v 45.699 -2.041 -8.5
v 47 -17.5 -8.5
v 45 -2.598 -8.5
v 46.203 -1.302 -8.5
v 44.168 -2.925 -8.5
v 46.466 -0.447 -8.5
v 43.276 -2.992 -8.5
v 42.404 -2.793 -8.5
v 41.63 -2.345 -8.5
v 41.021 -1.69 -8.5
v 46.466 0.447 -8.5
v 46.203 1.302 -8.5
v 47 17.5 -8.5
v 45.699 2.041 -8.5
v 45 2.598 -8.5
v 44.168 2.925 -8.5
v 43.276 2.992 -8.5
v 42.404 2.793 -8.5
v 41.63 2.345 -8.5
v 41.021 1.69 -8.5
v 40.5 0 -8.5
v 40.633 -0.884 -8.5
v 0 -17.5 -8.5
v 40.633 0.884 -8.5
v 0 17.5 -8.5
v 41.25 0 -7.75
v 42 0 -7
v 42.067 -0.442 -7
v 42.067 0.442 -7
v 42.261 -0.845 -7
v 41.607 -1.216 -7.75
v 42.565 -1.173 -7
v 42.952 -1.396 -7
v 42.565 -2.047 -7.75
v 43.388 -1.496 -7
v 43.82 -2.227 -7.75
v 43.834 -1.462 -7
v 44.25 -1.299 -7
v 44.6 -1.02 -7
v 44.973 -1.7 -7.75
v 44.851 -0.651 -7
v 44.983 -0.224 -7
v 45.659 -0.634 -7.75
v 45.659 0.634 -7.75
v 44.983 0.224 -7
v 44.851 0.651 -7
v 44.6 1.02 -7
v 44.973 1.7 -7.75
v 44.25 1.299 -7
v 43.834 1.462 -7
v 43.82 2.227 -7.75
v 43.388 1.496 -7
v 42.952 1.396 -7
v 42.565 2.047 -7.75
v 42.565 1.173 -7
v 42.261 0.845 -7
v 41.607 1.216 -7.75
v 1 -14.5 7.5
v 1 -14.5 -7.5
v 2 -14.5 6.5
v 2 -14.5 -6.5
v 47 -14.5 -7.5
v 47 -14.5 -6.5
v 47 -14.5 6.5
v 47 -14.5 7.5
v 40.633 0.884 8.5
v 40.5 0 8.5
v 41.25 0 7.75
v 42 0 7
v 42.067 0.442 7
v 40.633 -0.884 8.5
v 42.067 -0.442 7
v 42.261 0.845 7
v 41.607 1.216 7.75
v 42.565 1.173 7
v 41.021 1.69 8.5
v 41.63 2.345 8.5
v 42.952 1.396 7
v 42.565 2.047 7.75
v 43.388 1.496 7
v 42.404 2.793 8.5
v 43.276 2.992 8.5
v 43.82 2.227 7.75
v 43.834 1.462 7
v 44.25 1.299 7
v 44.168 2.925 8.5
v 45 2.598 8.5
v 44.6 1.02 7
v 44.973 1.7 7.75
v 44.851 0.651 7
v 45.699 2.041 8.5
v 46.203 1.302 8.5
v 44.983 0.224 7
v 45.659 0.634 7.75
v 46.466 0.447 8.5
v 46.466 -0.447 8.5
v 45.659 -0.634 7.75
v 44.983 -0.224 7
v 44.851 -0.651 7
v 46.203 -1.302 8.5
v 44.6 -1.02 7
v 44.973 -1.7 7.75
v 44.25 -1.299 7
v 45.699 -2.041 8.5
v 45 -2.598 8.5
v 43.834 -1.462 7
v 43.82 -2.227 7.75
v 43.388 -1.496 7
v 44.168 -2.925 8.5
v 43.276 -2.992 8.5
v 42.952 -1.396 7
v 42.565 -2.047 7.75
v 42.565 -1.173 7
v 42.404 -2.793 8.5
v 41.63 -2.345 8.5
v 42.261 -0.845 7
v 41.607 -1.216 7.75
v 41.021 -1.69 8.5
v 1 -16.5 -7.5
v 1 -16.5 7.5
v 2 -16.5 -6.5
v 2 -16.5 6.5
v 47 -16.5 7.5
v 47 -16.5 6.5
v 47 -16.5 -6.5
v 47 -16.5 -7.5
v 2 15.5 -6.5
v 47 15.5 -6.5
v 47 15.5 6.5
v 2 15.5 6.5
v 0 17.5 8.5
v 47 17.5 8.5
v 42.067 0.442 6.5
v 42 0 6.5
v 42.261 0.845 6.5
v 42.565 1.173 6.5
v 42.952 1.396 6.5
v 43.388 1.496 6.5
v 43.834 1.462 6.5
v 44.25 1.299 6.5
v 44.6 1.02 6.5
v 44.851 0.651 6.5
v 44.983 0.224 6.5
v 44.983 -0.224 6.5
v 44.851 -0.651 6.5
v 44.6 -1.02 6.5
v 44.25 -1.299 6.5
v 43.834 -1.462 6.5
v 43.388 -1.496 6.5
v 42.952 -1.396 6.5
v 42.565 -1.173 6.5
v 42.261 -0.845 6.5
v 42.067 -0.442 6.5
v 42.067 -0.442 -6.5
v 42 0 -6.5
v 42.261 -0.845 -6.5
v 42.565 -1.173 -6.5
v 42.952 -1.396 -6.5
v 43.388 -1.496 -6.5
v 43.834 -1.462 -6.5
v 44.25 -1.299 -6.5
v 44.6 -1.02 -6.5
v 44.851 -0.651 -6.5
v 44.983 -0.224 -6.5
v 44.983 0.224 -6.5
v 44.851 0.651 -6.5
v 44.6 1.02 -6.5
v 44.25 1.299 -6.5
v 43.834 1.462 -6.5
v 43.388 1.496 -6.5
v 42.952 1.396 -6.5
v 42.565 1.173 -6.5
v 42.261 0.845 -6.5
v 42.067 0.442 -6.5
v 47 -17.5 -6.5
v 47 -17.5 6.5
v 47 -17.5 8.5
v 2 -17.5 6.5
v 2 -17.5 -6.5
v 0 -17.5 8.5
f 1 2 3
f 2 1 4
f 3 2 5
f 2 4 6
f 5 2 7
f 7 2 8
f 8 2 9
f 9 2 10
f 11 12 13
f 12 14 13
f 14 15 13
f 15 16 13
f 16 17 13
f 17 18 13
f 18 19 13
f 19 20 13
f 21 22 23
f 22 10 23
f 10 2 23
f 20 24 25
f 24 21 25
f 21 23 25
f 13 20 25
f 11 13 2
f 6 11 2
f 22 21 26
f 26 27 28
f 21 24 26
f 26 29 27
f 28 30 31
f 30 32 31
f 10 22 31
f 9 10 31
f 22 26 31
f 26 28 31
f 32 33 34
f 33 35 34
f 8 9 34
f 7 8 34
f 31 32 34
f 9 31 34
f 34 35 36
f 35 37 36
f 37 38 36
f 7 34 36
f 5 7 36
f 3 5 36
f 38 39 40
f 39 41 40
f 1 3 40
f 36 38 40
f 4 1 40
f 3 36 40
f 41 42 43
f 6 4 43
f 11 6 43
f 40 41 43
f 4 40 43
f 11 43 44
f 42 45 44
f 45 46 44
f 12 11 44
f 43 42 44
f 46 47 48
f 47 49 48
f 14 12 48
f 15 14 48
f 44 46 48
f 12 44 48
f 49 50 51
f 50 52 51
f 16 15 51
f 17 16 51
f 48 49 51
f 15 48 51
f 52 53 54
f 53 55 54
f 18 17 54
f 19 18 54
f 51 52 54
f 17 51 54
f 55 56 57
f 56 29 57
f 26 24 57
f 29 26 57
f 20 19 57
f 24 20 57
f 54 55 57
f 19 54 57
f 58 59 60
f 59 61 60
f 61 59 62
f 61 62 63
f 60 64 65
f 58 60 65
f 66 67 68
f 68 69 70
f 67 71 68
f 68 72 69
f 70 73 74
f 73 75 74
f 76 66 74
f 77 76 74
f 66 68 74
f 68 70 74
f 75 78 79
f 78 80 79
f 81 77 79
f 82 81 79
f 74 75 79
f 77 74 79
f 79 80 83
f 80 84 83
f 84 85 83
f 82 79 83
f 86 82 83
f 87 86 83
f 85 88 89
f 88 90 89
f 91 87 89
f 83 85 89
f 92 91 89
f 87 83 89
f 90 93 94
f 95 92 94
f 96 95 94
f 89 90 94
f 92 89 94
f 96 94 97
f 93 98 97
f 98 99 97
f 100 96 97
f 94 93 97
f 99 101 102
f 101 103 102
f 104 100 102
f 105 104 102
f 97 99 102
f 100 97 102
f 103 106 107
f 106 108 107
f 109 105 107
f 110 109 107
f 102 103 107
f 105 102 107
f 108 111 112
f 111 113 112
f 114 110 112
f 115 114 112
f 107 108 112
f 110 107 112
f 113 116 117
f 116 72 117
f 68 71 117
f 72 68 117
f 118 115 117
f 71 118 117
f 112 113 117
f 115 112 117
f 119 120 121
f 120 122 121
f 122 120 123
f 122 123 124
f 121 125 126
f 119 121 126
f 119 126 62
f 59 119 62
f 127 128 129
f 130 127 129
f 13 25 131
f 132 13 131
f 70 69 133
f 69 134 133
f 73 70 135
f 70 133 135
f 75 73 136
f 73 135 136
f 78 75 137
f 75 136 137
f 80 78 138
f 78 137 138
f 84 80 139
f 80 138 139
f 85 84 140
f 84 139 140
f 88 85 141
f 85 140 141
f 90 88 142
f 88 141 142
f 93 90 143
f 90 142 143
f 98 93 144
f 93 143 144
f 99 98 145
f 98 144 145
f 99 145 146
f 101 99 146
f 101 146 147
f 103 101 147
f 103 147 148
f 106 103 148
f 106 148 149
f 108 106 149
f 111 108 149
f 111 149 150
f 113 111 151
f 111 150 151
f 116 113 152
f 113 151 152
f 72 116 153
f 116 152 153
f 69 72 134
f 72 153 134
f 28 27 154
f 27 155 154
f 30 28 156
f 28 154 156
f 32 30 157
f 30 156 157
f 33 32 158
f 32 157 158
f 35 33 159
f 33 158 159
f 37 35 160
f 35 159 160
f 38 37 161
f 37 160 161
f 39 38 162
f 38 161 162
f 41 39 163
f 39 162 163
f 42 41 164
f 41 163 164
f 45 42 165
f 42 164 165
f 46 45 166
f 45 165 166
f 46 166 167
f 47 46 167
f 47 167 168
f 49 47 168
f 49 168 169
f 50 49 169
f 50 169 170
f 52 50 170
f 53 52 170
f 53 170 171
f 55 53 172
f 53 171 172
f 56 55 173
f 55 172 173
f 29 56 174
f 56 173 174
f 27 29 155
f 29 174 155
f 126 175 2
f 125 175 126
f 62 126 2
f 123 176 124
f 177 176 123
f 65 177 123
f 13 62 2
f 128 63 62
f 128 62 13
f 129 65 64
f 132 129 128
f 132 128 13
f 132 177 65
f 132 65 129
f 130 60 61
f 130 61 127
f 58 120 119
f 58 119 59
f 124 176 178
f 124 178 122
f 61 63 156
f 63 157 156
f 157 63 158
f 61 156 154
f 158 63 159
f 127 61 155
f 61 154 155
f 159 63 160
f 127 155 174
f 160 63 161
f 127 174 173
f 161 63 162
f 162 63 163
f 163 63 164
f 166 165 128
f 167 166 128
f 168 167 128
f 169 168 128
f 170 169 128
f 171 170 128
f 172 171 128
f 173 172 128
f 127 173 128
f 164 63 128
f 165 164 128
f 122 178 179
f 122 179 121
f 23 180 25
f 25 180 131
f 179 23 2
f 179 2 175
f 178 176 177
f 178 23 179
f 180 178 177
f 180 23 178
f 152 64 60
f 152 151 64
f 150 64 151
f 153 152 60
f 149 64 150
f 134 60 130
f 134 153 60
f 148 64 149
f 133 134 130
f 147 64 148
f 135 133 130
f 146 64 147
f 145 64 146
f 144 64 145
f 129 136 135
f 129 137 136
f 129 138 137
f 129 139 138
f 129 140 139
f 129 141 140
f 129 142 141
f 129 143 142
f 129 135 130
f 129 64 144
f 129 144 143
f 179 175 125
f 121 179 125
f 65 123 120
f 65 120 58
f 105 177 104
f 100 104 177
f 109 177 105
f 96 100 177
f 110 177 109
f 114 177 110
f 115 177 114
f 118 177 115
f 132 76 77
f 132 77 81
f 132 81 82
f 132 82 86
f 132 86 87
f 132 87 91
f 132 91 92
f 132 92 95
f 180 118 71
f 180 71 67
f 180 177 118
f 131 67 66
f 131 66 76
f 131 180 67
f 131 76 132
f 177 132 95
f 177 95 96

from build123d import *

# Parameters (mm, degrees)
F0_W           = 35
F0_H           = 17
F1_DEPTH       = 47
F2_W           = 30
F2_H           = 13
F2_W_2         = 1
F3_DEPTH       = 45
F2_W_3         = 2
F2_H_2         = 1
F4_DEPTH       = 46
F6_D           = 3
F6_DEPTH       = 3
F6_CSINK_D     = 6
F6_CSINK_ANGLE = 90
F6_TIP         = 0.9012909285
F8_D           = 3
F8_DEPTH       = 3
F8_CSINK_D     = 6
F8_CSINK_ANGLE = 90
F8_TIP         = 0.9012909285


with BuildPart() as f1:
    # F0 (on Right) → F1 (new body)
    with BuildSketch(Plane.YZ):
        Rectangle(F0_W, F0_H)
    extrude(amount=F1_DEPTH)

    # F2 (on face) → F3 (cut)
    with BuildSketch(Plane.YZ.offset(47)):
        with Locations((0.5, 0)):
            Rectangle(F2_W, F2_H)
        with Locations((-17, 0)):
            Rectangle(F2_W_2, F2_H)
    extrude(amount=-F3_DEPTH, mode=Mode.SUBTRACT)

    # F2 (on face) → F4 (cut)
    with BuildSketch(Plane.YZ.offset(47)):
        with Locations((-15.5, 0)):
            Rectangle(F2_W_3, F2_H)
        with Locations((-15.5, 7)):
            Rectangle(F2_W_3, F2_H_2)
        with Locations((-15.5, -7)):
            Rectangle(F2_W_3, F2_H_2)
    extrude(amount=-F4_DEPTH, mode=Mode.SUBTRACT)

    # F6
    with Locations(Plane.XY.offset(8.5)):
        with Locations((43.5, 0)):
            CounterSinkHole(F6_D / 2, F6_CSINK_D / 2, depth=F6_DEPTH, counter_sink_angle=F6_CSINK_ANGLE)
            with Locations((0, 0, -(F6_DEPTH + F6_TIP / 2))):  # 118° drill point
                Cone(0, F6_D / 2, F6_TIP, mode=Mode.SUBTRACT)

    # F8
    with Locations(Plane(origin=(0, 0, -8.5), x_dir=(1, 0, 0), z_dir=(0, 0, -1))):
        with Locations((43.5, 0)):
            CounterSinkHole(F8_D / 2, F8_CSINK_D / 2, depth=F8_DEPTH, counter_sink_angle=F8_CSINK_ANGLE)
            with Locations((0, 0, -(F8_DEPTH + F8_TIP / 2))):  # 118° drill point
                Cone(0, F8_D / 2, F8_TIP, mode=Mode.SUBTRACT)


solid = f1.part
